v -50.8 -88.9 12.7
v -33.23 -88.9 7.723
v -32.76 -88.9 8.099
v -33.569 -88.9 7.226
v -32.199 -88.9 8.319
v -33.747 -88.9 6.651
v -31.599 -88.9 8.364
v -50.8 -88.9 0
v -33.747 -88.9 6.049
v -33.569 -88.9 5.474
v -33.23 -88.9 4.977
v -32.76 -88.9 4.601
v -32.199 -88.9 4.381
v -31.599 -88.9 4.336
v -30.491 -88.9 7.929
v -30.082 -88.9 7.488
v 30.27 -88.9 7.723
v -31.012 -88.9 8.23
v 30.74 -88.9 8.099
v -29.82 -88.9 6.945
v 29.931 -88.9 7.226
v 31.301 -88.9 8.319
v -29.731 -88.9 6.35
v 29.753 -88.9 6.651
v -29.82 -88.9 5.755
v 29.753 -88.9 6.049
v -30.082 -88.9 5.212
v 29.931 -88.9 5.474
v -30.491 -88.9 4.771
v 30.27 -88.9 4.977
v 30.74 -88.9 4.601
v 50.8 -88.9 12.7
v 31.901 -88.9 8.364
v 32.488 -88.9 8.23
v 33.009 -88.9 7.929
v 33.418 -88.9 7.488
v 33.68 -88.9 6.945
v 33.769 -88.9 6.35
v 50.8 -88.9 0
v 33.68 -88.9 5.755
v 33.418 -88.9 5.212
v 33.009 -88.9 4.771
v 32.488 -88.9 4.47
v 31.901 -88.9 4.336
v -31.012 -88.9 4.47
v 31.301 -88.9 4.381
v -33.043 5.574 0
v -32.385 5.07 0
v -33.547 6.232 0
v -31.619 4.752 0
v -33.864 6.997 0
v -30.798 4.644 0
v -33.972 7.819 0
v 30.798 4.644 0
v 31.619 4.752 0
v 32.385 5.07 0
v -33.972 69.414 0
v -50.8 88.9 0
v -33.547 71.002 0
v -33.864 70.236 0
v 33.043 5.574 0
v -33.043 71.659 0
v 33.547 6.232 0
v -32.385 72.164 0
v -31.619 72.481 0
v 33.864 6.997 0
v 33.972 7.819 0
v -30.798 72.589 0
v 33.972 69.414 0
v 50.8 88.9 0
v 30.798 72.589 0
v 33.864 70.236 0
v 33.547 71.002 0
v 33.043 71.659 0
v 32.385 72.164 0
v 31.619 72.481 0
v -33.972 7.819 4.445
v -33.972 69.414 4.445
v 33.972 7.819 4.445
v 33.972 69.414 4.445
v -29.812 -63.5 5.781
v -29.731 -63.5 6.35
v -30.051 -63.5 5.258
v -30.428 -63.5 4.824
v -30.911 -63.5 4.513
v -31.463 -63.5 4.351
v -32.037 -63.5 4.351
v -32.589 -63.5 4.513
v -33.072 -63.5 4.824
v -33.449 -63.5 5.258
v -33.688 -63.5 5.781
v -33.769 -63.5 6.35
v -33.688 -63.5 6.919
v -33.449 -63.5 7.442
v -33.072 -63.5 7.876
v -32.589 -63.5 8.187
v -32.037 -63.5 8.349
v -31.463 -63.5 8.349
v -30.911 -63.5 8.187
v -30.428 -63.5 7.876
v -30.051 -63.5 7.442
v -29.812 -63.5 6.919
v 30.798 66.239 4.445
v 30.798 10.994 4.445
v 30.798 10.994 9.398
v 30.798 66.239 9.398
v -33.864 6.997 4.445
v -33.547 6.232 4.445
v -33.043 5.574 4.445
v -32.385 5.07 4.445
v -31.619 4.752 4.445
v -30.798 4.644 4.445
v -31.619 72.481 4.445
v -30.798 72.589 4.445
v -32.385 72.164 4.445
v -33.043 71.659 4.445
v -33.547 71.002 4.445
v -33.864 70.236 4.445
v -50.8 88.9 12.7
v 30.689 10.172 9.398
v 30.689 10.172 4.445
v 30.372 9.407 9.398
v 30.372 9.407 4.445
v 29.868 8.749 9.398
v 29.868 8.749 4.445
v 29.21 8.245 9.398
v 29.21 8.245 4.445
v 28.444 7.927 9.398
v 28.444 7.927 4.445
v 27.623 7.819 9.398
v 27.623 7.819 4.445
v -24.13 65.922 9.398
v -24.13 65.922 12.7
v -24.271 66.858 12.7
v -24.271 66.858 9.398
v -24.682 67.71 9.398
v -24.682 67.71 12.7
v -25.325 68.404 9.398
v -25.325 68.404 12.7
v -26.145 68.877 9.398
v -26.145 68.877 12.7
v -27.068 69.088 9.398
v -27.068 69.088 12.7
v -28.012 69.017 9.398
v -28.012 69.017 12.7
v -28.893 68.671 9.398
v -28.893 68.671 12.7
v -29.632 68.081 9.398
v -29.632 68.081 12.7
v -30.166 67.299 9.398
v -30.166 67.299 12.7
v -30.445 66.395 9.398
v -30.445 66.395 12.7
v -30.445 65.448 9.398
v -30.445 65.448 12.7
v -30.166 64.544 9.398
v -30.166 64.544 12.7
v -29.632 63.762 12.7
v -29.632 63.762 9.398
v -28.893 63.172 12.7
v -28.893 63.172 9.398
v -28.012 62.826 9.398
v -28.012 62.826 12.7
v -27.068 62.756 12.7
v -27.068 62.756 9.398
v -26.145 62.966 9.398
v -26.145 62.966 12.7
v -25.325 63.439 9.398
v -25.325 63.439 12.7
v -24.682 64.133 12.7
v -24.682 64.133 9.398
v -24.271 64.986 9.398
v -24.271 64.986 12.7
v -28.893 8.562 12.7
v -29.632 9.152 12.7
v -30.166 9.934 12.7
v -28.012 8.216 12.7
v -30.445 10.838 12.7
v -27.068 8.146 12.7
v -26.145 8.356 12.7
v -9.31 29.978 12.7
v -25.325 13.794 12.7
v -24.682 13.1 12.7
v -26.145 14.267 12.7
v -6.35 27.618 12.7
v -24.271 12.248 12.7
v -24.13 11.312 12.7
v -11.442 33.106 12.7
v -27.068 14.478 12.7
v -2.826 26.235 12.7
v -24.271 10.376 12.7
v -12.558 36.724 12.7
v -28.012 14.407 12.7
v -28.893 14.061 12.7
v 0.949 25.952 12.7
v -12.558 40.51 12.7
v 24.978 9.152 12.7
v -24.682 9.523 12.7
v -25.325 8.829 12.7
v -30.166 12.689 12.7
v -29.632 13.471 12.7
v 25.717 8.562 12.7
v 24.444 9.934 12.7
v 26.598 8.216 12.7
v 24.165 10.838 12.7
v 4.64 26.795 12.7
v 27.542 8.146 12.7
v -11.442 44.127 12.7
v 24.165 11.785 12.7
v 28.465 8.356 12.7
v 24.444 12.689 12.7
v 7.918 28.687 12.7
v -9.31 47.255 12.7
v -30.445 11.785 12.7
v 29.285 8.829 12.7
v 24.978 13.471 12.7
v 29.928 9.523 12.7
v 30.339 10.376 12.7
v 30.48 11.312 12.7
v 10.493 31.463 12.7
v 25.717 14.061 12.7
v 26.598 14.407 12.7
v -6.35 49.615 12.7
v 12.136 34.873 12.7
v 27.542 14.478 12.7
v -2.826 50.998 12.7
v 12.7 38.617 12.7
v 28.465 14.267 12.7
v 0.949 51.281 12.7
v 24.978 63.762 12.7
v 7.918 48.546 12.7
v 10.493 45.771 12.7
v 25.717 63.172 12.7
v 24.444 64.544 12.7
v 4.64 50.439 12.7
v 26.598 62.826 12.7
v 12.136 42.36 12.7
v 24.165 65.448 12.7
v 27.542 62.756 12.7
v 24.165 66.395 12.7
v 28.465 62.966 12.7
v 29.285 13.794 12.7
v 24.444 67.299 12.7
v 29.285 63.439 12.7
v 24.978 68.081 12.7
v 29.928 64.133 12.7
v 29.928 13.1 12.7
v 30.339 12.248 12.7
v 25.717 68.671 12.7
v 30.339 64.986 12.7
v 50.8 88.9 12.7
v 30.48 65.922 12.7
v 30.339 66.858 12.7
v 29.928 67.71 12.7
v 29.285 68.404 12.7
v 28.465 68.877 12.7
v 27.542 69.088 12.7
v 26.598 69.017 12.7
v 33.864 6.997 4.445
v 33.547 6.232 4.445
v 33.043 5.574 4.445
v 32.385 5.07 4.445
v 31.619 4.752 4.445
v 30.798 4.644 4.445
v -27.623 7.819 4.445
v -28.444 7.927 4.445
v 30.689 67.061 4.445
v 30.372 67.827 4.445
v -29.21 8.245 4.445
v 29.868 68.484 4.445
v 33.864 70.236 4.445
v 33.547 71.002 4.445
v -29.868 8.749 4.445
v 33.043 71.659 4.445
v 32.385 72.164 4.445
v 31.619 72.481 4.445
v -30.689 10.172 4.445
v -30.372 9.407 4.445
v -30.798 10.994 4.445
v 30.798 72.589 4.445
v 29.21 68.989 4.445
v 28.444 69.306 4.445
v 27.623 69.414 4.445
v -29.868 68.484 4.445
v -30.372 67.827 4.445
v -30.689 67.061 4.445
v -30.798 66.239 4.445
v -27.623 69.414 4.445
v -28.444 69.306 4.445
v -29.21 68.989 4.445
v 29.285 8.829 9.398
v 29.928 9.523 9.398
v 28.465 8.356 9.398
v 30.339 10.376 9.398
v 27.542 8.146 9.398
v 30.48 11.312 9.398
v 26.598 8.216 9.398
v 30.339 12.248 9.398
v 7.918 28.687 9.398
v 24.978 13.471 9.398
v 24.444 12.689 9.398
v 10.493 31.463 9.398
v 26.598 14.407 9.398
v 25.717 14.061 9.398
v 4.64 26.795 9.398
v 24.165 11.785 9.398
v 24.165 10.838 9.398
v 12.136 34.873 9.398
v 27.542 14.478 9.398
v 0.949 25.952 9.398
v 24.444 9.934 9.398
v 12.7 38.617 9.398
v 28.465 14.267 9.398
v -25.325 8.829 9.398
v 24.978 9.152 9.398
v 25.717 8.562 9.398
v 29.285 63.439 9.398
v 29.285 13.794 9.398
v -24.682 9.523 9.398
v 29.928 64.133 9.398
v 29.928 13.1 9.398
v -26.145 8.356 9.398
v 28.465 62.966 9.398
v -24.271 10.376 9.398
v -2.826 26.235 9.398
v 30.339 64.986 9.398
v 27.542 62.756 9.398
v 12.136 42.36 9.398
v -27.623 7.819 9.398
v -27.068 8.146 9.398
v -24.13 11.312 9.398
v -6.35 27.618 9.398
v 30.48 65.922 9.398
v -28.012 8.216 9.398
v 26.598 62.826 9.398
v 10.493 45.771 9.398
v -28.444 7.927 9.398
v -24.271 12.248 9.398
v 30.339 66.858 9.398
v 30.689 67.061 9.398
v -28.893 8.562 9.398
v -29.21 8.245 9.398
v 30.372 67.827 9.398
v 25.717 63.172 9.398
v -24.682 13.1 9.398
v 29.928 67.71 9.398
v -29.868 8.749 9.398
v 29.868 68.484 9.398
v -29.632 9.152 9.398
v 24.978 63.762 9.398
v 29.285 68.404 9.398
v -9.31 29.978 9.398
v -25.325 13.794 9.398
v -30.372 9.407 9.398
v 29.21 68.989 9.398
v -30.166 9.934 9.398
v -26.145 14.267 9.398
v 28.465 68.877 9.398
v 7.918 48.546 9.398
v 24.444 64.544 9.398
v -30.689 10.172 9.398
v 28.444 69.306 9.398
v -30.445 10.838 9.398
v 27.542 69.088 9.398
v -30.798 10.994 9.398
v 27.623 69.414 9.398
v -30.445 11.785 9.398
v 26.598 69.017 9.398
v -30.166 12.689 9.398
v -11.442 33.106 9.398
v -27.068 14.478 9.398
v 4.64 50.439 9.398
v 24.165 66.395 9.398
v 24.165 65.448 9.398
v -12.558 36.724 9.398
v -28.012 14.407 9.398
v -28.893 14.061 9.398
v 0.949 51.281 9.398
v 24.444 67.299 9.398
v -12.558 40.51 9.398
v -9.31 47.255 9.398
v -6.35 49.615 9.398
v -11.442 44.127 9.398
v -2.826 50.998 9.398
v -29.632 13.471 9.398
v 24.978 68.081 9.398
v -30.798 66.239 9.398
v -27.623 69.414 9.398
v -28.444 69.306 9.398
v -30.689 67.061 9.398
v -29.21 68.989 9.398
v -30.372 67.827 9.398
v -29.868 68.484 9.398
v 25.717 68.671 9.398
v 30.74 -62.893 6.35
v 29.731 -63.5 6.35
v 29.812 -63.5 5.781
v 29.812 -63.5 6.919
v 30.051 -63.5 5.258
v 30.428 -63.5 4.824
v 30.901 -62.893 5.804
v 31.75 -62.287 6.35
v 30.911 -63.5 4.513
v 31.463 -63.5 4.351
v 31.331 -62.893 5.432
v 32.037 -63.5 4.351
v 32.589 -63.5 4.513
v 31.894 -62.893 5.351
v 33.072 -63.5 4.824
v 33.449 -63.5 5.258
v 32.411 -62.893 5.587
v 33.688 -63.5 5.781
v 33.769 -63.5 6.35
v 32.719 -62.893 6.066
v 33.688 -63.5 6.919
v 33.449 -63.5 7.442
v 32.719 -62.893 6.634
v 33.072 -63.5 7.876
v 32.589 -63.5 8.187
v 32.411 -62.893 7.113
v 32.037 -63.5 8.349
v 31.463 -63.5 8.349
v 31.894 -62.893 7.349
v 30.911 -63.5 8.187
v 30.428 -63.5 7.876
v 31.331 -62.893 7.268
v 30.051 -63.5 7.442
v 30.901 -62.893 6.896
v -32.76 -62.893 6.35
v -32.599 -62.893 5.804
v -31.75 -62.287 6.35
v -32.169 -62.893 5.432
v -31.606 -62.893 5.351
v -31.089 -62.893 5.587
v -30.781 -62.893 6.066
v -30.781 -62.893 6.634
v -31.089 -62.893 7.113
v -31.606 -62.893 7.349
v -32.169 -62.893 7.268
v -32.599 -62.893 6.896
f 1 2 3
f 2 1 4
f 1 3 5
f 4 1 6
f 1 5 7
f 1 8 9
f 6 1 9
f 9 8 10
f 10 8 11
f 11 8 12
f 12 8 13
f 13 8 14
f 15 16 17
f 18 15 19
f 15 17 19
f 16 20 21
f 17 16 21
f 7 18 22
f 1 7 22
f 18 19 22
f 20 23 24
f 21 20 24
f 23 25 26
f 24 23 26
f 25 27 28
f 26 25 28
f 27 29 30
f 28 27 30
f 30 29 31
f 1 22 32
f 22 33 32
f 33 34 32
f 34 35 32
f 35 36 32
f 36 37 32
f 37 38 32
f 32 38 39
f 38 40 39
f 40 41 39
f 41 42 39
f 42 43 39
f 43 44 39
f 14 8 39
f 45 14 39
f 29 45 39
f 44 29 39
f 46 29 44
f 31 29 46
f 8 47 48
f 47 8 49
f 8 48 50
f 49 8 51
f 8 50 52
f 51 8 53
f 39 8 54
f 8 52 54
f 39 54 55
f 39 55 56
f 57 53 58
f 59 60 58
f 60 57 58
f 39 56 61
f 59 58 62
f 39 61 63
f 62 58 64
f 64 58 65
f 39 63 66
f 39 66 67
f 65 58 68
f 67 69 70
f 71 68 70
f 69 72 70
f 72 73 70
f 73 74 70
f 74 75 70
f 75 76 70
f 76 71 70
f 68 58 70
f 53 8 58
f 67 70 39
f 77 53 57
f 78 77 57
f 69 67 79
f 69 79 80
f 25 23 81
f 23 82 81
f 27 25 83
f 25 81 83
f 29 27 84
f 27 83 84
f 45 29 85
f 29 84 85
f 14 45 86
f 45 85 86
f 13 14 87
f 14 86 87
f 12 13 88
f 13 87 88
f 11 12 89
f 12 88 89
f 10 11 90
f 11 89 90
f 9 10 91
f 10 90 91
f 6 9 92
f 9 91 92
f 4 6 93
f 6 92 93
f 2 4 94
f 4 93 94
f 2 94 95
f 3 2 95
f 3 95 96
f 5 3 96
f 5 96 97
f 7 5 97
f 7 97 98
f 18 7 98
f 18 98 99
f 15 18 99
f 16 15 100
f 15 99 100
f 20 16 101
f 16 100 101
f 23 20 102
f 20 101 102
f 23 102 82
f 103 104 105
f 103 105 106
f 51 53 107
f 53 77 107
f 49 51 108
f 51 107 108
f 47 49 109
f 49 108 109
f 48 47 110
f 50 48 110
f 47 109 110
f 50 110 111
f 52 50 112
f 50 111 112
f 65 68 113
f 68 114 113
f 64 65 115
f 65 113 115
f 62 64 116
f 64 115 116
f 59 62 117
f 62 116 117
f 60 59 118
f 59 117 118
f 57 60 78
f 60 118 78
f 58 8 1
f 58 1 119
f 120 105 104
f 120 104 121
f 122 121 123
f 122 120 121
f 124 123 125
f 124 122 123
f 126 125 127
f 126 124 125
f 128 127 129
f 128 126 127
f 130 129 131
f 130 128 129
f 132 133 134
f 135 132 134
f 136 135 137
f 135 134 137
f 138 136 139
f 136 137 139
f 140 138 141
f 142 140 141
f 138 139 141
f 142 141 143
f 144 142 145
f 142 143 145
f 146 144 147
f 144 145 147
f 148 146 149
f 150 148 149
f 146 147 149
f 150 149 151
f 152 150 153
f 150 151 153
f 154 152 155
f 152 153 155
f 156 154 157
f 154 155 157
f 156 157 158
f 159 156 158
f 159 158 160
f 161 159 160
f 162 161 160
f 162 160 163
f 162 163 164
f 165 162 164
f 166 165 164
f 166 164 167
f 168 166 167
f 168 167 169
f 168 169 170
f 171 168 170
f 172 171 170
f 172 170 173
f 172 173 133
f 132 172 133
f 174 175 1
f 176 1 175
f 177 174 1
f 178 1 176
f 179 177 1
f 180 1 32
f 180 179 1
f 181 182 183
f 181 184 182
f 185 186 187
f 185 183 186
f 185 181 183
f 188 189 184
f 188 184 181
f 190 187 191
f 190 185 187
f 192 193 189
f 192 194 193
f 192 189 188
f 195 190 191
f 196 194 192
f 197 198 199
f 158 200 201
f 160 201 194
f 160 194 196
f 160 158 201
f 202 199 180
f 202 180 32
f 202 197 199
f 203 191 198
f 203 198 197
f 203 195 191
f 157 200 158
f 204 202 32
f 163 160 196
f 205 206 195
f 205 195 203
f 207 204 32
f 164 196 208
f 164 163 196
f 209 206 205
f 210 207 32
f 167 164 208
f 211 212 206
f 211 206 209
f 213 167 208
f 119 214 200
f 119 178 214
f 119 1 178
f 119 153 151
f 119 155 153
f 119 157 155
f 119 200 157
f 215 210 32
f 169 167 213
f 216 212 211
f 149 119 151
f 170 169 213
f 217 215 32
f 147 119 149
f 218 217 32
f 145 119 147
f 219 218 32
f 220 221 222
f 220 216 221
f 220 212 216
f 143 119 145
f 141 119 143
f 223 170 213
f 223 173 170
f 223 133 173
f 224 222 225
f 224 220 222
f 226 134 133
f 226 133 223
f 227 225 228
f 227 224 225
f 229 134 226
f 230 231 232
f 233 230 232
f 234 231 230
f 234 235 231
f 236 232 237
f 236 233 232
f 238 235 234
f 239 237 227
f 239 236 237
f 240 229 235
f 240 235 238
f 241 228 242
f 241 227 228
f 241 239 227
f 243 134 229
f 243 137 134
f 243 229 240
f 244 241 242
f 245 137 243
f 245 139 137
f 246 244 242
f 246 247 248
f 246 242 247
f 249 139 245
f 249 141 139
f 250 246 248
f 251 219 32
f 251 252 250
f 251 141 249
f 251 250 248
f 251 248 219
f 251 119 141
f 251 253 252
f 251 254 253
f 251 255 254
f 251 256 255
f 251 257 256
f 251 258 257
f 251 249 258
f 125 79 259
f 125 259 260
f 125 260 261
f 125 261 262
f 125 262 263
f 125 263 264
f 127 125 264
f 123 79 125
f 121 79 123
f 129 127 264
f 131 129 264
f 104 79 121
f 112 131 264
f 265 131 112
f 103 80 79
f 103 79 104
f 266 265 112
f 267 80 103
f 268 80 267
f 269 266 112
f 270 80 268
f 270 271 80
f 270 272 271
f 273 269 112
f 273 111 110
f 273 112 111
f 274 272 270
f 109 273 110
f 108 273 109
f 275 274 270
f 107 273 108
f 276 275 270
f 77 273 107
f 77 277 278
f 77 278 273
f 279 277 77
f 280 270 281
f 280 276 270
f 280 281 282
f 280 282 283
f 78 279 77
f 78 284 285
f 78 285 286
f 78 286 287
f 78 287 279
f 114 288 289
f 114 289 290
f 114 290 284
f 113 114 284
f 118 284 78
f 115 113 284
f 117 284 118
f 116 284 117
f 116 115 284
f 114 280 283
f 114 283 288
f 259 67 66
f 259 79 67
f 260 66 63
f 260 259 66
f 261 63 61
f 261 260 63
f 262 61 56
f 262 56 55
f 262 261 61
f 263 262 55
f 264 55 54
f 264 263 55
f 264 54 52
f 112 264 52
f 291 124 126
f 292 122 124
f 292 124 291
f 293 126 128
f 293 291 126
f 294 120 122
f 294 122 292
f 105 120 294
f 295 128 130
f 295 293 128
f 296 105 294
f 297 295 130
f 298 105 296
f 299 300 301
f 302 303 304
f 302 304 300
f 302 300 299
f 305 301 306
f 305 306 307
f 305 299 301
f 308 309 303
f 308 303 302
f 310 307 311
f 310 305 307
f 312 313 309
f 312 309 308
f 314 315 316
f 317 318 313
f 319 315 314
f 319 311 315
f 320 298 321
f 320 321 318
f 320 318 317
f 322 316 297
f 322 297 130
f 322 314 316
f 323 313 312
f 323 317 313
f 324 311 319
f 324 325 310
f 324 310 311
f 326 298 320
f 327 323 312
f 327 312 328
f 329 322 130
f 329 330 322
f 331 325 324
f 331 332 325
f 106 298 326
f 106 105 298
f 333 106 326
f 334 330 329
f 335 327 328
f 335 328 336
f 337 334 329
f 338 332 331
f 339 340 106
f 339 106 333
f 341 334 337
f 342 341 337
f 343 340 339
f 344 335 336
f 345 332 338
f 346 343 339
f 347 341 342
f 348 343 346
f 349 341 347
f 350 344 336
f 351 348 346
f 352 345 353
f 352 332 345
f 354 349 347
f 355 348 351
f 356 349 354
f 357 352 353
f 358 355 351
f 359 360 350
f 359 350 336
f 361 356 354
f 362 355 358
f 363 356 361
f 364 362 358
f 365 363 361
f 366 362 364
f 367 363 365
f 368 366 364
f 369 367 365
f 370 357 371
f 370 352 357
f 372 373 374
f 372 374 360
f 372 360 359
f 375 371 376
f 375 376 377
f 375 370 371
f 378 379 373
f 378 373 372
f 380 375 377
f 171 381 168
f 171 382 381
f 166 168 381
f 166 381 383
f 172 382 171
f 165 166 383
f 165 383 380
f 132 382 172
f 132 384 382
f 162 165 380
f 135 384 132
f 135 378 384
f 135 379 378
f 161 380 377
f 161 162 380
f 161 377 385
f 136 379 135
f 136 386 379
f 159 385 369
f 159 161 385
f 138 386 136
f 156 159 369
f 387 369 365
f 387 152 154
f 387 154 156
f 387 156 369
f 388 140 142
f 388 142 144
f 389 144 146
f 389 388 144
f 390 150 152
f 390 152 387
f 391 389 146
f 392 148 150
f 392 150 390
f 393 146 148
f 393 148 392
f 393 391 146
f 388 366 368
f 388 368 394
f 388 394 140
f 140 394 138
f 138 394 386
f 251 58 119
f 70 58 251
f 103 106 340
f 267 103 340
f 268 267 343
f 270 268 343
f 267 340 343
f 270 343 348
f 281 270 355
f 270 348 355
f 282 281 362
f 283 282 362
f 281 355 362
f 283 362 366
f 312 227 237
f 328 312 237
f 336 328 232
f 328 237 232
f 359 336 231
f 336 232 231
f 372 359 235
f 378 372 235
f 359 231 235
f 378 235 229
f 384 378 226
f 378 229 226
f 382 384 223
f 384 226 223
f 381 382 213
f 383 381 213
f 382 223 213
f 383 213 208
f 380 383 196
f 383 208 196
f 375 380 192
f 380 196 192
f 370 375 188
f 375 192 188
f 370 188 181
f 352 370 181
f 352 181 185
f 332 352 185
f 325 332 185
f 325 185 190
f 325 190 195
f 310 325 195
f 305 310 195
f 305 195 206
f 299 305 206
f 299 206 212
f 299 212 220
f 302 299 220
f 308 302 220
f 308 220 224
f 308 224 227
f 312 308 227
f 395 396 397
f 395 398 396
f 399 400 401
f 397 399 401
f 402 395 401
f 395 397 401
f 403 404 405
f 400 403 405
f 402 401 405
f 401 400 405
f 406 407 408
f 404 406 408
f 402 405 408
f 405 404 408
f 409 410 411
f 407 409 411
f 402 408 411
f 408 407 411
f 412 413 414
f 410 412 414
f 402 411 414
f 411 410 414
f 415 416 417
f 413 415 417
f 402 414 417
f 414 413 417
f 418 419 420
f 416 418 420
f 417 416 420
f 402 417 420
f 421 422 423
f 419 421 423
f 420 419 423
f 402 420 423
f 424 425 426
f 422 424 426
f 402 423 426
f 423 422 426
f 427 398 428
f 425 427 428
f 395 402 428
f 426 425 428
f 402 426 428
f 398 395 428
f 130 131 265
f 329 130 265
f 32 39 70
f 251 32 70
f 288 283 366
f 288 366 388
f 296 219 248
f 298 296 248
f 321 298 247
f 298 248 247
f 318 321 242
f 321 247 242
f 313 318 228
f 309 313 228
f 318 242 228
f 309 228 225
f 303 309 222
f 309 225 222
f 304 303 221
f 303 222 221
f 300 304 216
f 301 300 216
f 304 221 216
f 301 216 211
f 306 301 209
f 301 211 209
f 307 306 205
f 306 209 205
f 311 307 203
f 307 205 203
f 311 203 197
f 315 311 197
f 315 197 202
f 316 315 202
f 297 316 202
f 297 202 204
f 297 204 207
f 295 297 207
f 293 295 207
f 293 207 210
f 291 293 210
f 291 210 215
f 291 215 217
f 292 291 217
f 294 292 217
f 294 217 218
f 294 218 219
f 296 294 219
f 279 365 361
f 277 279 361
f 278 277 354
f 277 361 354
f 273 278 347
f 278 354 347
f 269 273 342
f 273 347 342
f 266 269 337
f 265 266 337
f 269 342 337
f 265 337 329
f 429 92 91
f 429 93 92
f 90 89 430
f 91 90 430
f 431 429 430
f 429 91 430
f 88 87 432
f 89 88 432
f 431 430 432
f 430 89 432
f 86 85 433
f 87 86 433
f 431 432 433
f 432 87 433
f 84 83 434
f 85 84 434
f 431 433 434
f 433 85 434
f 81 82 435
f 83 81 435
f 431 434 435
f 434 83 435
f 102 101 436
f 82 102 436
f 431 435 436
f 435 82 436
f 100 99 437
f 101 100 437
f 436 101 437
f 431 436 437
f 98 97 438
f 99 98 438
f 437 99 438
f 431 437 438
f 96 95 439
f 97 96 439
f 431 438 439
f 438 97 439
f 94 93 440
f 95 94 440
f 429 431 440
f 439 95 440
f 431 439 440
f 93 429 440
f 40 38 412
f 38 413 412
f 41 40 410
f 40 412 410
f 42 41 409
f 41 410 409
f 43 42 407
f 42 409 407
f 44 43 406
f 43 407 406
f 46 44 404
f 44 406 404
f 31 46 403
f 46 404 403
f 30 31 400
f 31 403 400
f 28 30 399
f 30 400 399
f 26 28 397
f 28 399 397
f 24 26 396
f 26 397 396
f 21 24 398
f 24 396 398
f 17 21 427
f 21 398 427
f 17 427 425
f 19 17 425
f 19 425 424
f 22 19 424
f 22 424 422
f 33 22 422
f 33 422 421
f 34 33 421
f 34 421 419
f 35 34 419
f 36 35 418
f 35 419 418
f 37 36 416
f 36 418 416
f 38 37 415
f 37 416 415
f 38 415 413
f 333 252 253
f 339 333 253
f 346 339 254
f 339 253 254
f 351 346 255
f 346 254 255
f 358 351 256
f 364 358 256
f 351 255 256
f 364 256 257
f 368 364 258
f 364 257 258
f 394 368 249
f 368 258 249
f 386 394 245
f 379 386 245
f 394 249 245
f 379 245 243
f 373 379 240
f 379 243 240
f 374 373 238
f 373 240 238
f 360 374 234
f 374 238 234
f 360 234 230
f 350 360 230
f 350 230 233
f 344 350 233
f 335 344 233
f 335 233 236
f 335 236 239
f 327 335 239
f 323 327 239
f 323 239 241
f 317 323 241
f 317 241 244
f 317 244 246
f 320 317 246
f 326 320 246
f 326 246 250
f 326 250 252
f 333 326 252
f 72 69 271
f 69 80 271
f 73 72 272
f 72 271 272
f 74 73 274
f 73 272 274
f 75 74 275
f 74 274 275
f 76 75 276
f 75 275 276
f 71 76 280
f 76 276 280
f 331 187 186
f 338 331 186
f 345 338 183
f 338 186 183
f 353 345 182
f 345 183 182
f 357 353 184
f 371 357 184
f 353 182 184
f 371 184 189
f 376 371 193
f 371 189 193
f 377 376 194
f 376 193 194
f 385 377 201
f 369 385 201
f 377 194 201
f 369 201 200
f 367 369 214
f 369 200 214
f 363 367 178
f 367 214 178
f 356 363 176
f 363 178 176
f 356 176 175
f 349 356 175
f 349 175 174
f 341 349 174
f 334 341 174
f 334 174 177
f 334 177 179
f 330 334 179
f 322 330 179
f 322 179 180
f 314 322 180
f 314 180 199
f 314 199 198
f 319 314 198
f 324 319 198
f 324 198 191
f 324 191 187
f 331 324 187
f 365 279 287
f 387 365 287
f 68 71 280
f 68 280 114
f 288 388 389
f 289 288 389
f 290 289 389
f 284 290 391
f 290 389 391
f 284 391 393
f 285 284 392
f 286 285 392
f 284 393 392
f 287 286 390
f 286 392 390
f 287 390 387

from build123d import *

# Parameters (mm, degrees)
SKETCH1_W                  = 101.6
SKETCH1_H                  = 177.8
BOSS_EXTRUDE1_DEPTH        = 12.7
F_10_32_TAPPED_HOLE1_D     = 4.0386
F_10_32_TAPPED_HOLE1_DEPTH = 25.4
F_10_32_TAPPED_HOLE1_TIP   = 1.213317848
SKETCH5_R                  = 12.7
SKETCH5_R_2                = 3.175
CUT_EXTRUDE1_DEPTH         = 104.175287739
SKETCH6_W                  = 61.595
SKETCH6_H                  = 61.595
CUT_EXTRUDE2_DEPTH         = 9.398
FILLET1_R                  = 3.175
SKETCH7_W                  = 67.945
SKETCH7_H                  = 67.945
CUT_EXTRUDE3_DEPTH         = 4.445
FILLET2_R                  = 3.175


with BuildPart() as part:
    # Sketch1 → Boss-Extrude1 (new body)
    with BuildSketch(Plane.XY):
        Rectangle(SKETCH1_W, SKETCH1_H)
    extrude(amount=BOSS_EXTRUDE1_DEPTH)

    # #10-32 Tapped Hole1
    with Locations(Plane(origin=(0, -88.9, 0), x_dir=(-1, 0, 0), z_dir=(0, -1, 0))):
        with Locations((31.75, -6.35), (-31.75, -6.35)):
            Hole(F_10_32_TAPPED_HOLE1_D / 2, depth=F_10_32_TAPPED_HOLE1_DEPTH)
            with Locations((0, 0, -(F_10_32_TAPPED_HOLE1_DEPTH + F_10_32_TAPPED_HOLE1_TIP / 2))):  # 118° drill point
                Cone(0, F_10_32_TAPPED_HOLE1_D / 2, F_10_32_TAPPED_HOLE1_TIP, mode=Mode.SUBTRACT)

    # Sketch5 → Cut-Extrude1 (cut, through all)
    with BuildSketch(Plane.XY.offset(12.7)):
        with Locations((0, 38.616692093)):
            Circle(SKETCH5_R)
        with Locations((-27.305, 65.921692093)):
            Circle(SKETCH5_R_2)
        with Locations((27.305, 65.921692093)):
            Circle(SKETCH5_R_2)
        with Locations((27.305, 11.311692093)):
            Circle(SKETCH5_R_2)
        with Locations((-27.305, 11.311692093)):
            Circle(SKETCH5_R_2)
    extrude(amount=-CUT_EXTRUDE1_DEPTH, mode=Mode.SUBTRACT)

    # Sketch6 → Cut-Extrude2 (cut)
    with BuildSketch(Plane(origin=(0, 0, 0), x_dir=(-1, 0, 0), z_dir=(0, 0, -1))):
        with Locations((0, 38.616692093)):
            Rectangle(SKETCH6_W, SKETCH6_H)
    extrude(amount=-CUT_EXTRUDE2_DEPTH, mode=Mode.SUBTRACT)

    # Fillet1
    fillet1_edges = [part.edges().sort_by_distance(p)[0] for p in [
        (-30.7975, 69.414192093, 4.699),
        (-30.7975, 7.819192093, 4.699),
        (30.7975, 7.819192093, 4.699),
        (30.7975, 69.414192093, 4.699),
    ]]
    fillet(fillet1_edges, radius=FILLET1_R)

    # Sketch7 → Cut-Extrude3 (cut)
    with BuildSketch(Plane(origin=(0, 0, 0), x_dir=(-1, 0, 0), z_dir=(0, 0, -1))):
        with Locations((0, 38.616692093)):
            Rectangle(SKETCH7_W, SKETCH7_H)
    extrude(amount=-CUT_EXTRUDE3_DEPTH, mode=Mode.SUBTRACT)

    # Fillet2
    fillet2_edges = [part.edges().sort_by_distance(p)[0] for p in [
        (-33.9725, 72.589192093, 2.2225),
        (-33.9725, 4.644192093, 2.2225),
        (33.9725, 4.644192093, 2.2225),
        (33.9725, 72.589192093, 2.2225),
    ]]
    fillet(fillet2_edges, radius=FILLET2_R)


solid = part.part
